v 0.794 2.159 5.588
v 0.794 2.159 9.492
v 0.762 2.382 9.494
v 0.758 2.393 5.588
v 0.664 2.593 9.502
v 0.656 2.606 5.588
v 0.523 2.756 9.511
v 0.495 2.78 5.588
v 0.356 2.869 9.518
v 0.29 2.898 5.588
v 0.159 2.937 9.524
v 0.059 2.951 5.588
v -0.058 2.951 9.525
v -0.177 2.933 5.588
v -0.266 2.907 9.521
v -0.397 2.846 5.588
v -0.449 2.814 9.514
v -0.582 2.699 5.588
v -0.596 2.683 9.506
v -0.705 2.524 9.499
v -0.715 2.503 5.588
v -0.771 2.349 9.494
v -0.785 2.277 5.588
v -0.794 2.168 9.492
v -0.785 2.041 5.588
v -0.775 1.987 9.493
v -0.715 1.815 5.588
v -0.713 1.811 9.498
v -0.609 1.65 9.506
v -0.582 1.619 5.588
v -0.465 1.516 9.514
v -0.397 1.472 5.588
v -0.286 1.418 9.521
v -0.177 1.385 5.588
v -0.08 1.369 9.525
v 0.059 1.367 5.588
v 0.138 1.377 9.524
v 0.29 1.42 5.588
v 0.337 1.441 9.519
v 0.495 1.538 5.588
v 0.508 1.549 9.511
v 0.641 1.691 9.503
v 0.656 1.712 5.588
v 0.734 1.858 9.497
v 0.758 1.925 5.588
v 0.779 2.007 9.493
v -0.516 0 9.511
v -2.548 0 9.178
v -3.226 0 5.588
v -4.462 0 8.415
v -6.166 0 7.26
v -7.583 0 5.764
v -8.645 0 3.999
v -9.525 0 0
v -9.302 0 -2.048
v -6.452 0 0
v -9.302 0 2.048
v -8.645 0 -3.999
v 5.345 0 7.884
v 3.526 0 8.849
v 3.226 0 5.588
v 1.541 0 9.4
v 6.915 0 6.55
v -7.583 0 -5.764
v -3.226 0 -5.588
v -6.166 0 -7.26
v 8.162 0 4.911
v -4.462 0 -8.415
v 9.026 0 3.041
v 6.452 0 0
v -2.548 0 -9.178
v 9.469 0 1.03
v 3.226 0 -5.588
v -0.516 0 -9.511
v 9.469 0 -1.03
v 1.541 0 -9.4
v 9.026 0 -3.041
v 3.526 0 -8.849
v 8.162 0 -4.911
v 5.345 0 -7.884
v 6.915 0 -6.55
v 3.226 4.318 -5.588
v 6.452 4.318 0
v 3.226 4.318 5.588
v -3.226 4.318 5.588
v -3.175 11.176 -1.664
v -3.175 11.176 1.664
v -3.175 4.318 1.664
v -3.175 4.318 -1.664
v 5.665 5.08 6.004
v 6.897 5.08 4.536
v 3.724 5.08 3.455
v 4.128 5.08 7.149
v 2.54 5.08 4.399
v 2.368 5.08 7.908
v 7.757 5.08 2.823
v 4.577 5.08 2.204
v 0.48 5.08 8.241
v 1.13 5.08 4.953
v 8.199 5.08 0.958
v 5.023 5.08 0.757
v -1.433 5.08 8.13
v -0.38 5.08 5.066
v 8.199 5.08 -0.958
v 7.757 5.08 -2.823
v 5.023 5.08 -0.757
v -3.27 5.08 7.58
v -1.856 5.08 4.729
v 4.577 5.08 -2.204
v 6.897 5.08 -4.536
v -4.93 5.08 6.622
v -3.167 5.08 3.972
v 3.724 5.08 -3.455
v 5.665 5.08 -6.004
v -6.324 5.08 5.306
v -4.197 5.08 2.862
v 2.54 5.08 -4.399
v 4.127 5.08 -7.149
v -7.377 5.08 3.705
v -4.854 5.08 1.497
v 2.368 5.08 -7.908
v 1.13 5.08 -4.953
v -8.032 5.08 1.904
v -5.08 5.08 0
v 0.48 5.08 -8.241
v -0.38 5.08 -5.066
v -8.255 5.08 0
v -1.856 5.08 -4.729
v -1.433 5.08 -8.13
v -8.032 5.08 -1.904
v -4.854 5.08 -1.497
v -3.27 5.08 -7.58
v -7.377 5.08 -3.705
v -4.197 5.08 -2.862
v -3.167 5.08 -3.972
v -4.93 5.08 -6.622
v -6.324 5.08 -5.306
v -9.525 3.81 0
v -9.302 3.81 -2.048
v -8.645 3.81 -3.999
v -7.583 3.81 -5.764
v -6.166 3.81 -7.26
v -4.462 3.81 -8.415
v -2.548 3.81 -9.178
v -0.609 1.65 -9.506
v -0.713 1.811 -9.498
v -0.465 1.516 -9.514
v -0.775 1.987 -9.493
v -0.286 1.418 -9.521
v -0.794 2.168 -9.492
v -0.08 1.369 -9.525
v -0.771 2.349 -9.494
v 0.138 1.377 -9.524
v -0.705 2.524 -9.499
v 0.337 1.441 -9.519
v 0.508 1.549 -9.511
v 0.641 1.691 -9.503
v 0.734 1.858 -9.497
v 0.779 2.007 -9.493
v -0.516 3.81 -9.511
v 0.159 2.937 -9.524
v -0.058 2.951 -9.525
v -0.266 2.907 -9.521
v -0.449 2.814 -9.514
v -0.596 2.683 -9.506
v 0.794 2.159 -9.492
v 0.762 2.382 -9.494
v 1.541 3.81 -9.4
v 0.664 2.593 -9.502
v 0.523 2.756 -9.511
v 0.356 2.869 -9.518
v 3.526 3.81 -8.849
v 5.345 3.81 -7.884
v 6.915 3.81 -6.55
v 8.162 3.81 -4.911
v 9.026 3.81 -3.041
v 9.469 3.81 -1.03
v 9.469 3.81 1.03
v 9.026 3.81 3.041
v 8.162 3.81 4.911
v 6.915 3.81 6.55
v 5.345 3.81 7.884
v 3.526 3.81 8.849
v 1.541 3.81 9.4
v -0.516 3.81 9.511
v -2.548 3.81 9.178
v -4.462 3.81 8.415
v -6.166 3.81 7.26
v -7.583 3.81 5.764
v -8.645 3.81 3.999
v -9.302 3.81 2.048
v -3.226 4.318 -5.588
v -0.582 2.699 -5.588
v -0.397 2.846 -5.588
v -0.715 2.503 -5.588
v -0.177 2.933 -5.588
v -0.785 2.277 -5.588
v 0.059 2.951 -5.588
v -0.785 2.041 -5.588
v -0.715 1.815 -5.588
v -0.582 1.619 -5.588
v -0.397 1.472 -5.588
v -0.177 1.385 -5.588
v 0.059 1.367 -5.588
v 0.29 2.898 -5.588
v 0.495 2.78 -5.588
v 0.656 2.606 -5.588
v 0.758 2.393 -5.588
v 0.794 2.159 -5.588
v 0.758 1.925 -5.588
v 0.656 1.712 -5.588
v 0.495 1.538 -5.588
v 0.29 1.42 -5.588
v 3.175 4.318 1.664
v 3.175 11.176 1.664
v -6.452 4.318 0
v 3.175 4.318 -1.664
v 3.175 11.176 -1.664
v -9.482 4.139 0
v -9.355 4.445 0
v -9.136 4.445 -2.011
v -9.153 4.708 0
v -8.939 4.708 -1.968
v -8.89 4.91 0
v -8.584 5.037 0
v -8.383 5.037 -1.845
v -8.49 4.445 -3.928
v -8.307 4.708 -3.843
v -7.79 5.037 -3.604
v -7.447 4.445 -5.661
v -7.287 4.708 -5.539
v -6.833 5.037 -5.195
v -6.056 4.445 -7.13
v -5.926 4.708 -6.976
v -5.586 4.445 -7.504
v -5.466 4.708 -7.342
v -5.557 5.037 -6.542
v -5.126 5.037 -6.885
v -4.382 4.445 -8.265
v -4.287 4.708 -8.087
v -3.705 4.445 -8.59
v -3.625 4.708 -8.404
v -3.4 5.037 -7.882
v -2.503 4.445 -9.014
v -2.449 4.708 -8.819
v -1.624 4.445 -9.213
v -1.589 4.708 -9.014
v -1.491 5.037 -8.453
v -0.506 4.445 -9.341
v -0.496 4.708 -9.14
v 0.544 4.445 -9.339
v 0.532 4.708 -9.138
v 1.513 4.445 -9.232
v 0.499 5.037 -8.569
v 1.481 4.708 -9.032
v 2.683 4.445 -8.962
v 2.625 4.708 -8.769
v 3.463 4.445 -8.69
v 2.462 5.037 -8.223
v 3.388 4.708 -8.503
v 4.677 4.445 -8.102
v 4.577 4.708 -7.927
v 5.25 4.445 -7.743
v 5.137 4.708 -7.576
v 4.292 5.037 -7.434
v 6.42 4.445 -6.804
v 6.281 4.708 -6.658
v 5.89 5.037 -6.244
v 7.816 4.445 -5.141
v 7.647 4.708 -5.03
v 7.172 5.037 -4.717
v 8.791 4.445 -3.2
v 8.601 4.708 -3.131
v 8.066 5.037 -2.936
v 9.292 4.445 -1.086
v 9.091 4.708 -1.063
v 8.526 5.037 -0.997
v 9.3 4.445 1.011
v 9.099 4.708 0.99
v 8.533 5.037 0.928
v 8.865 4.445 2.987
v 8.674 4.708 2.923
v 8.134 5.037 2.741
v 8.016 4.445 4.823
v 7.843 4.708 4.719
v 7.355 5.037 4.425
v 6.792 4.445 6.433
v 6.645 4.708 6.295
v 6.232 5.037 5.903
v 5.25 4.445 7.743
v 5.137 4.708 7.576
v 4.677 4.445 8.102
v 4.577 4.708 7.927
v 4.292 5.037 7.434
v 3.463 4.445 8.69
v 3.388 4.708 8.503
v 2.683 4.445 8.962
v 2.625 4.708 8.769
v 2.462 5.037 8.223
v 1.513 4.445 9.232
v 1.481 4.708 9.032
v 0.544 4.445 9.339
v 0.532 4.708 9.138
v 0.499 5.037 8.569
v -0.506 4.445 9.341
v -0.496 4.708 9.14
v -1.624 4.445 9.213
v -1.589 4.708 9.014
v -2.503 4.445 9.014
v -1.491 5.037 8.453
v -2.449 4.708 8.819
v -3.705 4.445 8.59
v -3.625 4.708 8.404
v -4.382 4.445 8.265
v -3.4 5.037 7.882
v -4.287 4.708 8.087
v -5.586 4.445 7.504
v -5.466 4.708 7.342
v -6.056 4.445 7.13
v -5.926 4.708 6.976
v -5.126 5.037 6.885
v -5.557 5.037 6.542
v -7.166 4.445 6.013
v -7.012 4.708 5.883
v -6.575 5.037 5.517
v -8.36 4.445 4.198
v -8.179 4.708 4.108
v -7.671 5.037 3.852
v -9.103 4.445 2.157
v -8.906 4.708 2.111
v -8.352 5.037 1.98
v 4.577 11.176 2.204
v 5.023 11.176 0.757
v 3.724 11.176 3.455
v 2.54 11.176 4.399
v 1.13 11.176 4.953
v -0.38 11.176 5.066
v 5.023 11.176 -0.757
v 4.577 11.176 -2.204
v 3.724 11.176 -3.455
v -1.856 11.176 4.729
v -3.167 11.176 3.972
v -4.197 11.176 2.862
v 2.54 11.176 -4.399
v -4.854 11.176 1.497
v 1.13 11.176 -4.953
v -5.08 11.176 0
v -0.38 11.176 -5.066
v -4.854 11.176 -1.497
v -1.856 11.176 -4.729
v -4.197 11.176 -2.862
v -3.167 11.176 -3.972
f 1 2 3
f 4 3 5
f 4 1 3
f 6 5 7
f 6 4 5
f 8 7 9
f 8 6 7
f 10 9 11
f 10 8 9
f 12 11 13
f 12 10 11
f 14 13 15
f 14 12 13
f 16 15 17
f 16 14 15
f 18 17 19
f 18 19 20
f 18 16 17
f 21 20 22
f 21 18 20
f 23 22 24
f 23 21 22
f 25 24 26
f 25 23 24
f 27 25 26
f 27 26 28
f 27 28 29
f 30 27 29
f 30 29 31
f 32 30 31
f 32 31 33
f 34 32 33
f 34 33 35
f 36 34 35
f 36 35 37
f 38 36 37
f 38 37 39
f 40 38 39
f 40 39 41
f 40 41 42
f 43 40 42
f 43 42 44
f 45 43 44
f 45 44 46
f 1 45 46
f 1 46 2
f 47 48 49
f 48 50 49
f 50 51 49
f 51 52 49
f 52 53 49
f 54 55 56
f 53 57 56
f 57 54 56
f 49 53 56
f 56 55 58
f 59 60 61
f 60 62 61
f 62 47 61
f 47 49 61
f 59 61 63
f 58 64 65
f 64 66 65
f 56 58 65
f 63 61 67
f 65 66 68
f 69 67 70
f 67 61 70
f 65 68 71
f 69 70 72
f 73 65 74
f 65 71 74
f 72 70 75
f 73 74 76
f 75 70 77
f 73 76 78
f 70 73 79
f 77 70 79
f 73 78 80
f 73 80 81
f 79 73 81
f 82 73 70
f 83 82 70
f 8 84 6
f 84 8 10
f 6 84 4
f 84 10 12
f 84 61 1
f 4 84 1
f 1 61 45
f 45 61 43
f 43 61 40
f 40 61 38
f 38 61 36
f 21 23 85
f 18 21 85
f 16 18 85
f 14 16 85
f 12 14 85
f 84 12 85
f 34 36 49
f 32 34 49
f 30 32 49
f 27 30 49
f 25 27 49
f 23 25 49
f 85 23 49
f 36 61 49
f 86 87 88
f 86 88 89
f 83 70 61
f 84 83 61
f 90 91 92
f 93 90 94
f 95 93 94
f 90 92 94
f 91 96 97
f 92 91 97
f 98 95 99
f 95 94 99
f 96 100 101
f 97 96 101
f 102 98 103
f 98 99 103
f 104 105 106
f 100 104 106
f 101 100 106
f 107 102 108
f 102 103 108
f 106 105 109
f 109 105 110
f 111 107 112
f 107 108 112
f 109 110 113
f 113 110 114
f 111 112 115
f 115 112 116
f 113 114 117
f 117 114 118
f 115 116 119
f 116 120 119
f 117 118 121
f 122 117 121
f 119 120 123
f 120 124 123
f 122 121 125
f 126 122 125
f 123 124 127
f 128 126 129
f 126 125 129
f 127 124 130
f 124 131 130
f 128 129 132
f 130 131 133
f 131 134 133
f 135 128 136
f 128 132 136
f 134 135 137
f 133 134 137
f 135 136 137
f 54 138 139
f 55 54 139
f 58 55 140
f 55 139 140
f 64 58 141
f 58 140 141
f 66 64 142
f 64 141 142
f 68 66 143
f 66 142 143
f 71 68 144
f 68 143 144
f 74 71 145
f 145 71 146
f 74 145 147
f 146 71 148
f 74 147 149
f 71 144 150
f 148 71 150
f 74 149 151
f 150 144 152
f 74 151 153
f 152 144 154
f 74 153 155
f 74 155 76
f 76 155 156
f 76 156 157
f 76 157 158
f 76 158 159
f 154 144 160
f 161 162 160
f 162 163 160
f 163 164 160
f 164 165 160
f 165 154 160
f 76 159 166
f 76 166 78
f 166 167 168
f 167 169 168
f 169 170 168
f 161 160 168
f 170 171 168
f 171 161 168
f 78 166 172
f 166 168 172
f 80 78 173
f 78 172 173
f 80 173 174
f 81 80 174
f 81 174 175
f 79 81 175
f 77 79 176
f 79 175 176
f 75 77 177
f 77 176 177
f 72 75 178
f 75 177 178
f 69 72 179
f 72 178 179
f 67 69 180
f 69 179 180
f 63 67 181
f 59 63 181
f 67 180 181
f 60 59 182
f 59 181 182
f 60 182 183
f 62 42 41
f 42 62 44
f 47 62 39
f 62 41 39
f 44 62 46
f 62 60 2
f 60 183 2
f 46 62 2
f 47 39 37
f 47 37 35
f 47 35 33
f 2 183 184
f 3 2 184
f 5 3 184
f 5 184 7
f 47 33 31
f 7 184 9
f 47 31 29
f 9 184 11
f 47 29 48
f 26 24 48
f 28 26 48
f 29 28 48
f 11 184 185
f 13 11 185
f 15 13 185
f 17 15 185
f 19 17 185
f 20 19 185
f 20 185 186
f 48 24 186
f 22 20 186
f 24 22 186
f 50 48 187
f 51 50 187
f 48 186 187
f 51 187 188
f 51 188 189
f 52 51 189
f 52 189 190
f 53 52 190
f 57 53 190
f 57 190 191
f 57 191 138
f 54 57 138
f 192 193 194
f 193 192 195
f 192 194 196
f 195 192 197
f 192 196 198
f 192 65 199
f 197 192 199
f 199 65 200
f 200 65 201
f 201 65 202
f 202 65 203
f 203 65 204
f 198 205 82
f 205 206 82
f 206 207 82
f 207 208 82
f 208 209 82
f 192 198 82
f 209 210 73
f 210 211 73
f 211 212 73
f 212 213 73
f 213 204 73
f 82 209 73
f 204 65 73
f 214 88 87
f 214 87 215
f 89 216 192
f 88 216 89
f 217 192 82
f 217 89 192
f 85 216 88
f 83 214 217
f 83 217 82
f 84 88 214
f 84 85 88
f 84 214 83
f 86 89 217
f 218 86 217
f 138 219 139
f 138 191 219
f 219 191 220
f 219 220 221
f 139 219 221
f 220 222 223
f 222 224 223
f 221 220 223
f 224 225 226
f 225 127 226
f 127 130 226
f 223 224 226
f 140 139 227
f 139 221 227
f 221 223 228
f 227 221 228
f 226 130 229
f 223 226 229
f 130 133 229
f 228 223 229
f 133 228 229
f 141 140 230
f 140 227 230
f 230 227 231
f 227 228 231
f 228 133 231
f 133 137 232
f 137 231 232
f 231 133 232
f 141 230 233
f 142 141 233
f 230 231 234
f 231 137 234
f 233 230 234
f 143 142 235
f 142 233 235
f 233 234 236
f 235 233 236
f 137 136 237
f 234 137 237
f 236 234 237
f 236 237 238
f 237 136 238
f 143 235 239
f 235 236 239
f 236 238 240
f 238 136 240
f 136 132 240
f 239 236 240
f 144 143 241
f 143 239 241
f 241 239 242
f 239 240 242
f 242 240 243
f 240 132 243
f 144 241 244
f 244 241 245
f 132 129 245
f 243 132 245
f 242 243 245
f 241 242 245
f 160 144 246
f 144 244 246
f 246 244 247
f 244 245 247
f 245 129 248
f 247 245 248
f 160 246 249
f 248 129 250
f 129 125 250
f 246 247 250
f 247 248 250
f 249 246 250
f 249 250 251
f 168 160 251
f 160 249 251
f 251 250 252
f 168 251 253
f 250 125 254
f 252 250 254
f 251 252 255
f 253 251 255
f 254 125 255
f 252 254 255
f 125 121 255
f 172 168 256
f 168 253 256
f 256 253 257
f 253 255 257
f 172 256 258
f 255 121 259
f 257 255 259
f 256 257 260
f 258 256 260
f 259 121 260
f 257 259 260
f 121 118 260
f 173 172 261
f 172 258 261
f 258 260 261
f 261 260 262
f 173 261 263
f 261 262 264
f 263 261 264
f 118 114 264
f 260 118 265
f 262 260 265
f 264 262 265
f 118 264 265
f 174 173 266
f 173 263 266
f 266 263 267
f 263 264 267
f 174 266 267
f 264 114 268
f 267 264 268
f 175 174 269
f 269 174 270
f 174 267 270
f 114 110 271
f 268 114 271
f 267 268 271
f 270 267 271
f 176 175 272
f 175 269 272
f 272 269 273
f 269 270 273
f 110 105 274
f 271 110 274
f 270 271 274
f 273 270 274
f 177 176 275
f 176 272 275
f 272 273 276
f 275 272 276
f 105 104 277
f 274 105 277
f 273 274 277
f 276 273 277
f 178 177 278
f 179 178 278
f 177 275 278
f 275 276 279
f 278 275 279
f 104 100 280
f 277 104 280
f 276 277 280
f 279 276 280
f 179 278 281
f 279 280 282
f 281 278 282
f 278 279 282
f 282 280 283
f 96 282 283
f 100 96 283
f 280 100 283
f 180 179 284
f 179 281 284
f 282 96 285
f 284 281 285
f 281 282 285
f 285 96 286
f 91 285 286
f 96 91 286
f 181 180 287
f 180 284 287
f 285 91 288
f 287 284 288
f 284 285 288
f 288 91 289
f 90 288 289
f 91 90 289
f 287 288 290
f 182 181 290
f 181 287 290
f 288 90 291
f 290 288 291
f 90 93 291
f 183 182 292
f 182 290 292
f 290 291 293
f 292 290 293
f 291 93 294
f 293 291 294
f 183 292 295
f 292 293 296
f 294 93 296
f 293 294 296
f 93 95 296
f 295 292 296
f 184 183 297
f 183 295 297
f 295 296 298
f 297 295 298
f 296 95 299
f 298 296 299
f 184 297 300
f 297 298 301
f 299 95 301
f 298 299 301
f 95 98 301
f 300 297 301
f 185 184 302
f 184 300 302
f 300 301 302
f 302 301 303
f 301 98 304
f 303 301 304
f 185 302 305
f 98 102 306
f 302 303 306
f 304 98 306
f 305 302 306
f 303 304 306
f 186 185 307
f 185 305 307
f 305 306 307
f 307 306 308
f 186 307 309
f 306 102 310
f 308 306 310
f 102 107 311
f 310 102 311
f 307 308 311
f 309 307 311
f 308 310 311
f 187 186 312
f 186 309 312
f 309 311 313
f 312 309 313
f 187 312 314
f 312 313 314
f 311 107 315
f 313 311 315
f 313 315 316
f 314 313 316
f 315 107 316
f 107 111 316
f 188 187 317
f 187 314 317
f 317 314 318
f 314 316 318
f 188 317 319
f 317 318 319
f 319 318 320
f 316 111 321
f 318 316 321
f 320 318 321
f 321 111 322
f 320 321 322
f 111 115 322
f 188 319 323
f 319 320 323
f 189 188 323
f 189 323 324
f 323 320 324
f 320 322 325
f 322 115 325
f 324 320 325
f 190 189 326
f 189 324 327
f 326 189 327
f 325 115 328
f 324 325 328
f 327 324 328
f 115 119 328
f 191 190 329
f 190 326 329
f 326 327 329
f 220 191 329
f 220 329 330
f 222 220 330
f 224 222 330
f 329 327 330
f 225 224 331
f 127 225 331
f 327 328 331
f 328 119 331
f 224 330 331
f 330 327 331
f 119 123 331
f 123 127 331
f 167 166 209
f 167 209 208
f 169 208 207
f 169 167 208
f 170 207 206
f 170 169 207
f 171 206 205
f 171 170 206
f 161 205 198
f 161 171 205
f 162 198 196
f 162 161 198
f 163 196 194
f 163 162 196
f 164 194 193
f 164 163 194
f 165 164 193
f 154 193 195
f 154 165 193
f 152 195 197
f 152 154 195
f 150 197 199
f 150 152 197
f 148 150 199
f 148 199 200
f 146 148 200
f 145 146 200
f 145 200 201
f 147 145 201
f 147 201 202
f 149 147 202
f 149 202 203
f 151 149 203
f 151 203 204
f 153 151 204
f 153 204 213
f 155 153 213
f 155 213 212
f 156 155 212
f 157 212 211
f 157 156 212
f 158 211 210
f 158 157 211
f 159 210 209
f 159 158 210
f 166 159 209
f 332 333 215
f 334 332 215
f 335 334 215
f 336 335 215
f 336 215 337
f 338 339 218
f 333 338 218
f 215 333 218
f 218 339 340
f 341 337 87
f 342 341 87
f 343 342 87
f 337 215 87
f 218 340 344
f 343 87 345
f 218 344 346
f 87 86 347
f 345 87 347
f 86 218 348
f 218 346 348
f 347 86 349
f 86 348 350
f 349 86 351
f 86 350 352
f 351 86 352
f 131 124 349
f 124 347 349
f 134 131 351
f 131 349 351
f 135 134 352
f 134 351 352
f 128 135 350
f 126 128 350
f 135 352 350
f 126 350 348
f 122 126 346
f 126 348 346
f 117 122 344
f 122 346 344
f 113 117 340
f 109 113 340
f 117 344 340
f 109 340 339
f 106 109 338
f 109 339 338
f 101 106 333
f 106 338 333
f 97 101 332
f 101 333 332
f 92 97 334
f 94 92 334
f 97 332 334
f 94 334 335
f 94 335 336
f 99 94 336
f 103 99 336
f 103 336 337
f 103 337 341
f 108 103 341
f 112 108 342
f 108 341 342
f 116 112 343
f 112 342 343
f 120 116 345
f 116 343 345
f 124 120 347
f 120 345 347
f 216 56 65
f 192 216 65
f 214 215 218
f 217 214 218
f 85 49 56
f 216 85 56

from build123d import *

# Parameters (mm, degrees)
CUT_EXTRUDE1_DEPTH      = 4.318
SKETCH4_W               = 6.35
SKETCH4_H               = 3.3274
CUT_EXTRUDE2_DEPTH      = 7.112
CUT_EXTRUDE3_DEPTH      = 22.07205187
CUT_EXTRUDE3_DEPTH_BACK = 22.07205187
SKETCH5_R               = 0.79375
FILLET2_R               = 1.27


with BuildPart() as part:
    # Sketch2 → Revolve1 (revolve)
    with BuildSketch(Plane.XY, mode=Mode.PRIVATE) as revolve1_sk:
        Polygon((9.525, 0), (9.525, 5.08), (5.08, 5.08), (5.08, 11.176), (0, 11.176), (0, 0), align=None)
    revolve(revolve1_sk.sketch.rotate(Axis((0, 11.176, 0), (0, -1, 0)), 180), axis=Axis((0, 11.176, 0), (0, -1, 0)))

    # Sketch3 → Cut-Extrude1 (cut)
    with BuildSketch(Plane.XZ):
        Polygon((6.452466608, 0), (3.226233304, 5.588), (-3.226233304, 5.588), (-6.452466608, 0), (-3.226233304, -5.588), (3.226233304, -5.588), align=None)
    extrude(amount=-CUT_EXTRUDE1_DEPTH, mode=Mode.SUBTRACT)

    # Sketch4 → Cut-Extrude2 (cut)
    with BuildSketch(Plane(origin=(0, 11.176, 0), x_dir=(1, 0, 0), z_dir=(0, 1, 0))):
        Rectangle(SKETCH4_W, SKETCH4_H)
    extrude(amount=-CUT_EXTRUDE2_DEPTH, mode=Mode.SUBTRACT)

    # Sketch5 → Cut-Extrude3 (cut, two sides: drawn at the far end of the back side and taken through both)
    with BuildSketch(Plane.XY.offset(-5.588).offset(-CUT_EXTRUDE3_DEPTH_BACK)):
        with Locations((0, 2.159)):
            Circle(SKETCH5_R)
    extrude(amount=CUT_EXTRUDE3_DEPTH + CUT_EXTRUDE3_DEPTH_BACK, mode=Mode.SUBTRACT)

    # Fillet2
    fillet2_edges = [part.edges().sort_by_distance(p)[0] for p in [
        (9.525, 5.08, 0),
    ]]
    fillet(fillet2_edges, radius=FILLET2_R)


solid = part.part
